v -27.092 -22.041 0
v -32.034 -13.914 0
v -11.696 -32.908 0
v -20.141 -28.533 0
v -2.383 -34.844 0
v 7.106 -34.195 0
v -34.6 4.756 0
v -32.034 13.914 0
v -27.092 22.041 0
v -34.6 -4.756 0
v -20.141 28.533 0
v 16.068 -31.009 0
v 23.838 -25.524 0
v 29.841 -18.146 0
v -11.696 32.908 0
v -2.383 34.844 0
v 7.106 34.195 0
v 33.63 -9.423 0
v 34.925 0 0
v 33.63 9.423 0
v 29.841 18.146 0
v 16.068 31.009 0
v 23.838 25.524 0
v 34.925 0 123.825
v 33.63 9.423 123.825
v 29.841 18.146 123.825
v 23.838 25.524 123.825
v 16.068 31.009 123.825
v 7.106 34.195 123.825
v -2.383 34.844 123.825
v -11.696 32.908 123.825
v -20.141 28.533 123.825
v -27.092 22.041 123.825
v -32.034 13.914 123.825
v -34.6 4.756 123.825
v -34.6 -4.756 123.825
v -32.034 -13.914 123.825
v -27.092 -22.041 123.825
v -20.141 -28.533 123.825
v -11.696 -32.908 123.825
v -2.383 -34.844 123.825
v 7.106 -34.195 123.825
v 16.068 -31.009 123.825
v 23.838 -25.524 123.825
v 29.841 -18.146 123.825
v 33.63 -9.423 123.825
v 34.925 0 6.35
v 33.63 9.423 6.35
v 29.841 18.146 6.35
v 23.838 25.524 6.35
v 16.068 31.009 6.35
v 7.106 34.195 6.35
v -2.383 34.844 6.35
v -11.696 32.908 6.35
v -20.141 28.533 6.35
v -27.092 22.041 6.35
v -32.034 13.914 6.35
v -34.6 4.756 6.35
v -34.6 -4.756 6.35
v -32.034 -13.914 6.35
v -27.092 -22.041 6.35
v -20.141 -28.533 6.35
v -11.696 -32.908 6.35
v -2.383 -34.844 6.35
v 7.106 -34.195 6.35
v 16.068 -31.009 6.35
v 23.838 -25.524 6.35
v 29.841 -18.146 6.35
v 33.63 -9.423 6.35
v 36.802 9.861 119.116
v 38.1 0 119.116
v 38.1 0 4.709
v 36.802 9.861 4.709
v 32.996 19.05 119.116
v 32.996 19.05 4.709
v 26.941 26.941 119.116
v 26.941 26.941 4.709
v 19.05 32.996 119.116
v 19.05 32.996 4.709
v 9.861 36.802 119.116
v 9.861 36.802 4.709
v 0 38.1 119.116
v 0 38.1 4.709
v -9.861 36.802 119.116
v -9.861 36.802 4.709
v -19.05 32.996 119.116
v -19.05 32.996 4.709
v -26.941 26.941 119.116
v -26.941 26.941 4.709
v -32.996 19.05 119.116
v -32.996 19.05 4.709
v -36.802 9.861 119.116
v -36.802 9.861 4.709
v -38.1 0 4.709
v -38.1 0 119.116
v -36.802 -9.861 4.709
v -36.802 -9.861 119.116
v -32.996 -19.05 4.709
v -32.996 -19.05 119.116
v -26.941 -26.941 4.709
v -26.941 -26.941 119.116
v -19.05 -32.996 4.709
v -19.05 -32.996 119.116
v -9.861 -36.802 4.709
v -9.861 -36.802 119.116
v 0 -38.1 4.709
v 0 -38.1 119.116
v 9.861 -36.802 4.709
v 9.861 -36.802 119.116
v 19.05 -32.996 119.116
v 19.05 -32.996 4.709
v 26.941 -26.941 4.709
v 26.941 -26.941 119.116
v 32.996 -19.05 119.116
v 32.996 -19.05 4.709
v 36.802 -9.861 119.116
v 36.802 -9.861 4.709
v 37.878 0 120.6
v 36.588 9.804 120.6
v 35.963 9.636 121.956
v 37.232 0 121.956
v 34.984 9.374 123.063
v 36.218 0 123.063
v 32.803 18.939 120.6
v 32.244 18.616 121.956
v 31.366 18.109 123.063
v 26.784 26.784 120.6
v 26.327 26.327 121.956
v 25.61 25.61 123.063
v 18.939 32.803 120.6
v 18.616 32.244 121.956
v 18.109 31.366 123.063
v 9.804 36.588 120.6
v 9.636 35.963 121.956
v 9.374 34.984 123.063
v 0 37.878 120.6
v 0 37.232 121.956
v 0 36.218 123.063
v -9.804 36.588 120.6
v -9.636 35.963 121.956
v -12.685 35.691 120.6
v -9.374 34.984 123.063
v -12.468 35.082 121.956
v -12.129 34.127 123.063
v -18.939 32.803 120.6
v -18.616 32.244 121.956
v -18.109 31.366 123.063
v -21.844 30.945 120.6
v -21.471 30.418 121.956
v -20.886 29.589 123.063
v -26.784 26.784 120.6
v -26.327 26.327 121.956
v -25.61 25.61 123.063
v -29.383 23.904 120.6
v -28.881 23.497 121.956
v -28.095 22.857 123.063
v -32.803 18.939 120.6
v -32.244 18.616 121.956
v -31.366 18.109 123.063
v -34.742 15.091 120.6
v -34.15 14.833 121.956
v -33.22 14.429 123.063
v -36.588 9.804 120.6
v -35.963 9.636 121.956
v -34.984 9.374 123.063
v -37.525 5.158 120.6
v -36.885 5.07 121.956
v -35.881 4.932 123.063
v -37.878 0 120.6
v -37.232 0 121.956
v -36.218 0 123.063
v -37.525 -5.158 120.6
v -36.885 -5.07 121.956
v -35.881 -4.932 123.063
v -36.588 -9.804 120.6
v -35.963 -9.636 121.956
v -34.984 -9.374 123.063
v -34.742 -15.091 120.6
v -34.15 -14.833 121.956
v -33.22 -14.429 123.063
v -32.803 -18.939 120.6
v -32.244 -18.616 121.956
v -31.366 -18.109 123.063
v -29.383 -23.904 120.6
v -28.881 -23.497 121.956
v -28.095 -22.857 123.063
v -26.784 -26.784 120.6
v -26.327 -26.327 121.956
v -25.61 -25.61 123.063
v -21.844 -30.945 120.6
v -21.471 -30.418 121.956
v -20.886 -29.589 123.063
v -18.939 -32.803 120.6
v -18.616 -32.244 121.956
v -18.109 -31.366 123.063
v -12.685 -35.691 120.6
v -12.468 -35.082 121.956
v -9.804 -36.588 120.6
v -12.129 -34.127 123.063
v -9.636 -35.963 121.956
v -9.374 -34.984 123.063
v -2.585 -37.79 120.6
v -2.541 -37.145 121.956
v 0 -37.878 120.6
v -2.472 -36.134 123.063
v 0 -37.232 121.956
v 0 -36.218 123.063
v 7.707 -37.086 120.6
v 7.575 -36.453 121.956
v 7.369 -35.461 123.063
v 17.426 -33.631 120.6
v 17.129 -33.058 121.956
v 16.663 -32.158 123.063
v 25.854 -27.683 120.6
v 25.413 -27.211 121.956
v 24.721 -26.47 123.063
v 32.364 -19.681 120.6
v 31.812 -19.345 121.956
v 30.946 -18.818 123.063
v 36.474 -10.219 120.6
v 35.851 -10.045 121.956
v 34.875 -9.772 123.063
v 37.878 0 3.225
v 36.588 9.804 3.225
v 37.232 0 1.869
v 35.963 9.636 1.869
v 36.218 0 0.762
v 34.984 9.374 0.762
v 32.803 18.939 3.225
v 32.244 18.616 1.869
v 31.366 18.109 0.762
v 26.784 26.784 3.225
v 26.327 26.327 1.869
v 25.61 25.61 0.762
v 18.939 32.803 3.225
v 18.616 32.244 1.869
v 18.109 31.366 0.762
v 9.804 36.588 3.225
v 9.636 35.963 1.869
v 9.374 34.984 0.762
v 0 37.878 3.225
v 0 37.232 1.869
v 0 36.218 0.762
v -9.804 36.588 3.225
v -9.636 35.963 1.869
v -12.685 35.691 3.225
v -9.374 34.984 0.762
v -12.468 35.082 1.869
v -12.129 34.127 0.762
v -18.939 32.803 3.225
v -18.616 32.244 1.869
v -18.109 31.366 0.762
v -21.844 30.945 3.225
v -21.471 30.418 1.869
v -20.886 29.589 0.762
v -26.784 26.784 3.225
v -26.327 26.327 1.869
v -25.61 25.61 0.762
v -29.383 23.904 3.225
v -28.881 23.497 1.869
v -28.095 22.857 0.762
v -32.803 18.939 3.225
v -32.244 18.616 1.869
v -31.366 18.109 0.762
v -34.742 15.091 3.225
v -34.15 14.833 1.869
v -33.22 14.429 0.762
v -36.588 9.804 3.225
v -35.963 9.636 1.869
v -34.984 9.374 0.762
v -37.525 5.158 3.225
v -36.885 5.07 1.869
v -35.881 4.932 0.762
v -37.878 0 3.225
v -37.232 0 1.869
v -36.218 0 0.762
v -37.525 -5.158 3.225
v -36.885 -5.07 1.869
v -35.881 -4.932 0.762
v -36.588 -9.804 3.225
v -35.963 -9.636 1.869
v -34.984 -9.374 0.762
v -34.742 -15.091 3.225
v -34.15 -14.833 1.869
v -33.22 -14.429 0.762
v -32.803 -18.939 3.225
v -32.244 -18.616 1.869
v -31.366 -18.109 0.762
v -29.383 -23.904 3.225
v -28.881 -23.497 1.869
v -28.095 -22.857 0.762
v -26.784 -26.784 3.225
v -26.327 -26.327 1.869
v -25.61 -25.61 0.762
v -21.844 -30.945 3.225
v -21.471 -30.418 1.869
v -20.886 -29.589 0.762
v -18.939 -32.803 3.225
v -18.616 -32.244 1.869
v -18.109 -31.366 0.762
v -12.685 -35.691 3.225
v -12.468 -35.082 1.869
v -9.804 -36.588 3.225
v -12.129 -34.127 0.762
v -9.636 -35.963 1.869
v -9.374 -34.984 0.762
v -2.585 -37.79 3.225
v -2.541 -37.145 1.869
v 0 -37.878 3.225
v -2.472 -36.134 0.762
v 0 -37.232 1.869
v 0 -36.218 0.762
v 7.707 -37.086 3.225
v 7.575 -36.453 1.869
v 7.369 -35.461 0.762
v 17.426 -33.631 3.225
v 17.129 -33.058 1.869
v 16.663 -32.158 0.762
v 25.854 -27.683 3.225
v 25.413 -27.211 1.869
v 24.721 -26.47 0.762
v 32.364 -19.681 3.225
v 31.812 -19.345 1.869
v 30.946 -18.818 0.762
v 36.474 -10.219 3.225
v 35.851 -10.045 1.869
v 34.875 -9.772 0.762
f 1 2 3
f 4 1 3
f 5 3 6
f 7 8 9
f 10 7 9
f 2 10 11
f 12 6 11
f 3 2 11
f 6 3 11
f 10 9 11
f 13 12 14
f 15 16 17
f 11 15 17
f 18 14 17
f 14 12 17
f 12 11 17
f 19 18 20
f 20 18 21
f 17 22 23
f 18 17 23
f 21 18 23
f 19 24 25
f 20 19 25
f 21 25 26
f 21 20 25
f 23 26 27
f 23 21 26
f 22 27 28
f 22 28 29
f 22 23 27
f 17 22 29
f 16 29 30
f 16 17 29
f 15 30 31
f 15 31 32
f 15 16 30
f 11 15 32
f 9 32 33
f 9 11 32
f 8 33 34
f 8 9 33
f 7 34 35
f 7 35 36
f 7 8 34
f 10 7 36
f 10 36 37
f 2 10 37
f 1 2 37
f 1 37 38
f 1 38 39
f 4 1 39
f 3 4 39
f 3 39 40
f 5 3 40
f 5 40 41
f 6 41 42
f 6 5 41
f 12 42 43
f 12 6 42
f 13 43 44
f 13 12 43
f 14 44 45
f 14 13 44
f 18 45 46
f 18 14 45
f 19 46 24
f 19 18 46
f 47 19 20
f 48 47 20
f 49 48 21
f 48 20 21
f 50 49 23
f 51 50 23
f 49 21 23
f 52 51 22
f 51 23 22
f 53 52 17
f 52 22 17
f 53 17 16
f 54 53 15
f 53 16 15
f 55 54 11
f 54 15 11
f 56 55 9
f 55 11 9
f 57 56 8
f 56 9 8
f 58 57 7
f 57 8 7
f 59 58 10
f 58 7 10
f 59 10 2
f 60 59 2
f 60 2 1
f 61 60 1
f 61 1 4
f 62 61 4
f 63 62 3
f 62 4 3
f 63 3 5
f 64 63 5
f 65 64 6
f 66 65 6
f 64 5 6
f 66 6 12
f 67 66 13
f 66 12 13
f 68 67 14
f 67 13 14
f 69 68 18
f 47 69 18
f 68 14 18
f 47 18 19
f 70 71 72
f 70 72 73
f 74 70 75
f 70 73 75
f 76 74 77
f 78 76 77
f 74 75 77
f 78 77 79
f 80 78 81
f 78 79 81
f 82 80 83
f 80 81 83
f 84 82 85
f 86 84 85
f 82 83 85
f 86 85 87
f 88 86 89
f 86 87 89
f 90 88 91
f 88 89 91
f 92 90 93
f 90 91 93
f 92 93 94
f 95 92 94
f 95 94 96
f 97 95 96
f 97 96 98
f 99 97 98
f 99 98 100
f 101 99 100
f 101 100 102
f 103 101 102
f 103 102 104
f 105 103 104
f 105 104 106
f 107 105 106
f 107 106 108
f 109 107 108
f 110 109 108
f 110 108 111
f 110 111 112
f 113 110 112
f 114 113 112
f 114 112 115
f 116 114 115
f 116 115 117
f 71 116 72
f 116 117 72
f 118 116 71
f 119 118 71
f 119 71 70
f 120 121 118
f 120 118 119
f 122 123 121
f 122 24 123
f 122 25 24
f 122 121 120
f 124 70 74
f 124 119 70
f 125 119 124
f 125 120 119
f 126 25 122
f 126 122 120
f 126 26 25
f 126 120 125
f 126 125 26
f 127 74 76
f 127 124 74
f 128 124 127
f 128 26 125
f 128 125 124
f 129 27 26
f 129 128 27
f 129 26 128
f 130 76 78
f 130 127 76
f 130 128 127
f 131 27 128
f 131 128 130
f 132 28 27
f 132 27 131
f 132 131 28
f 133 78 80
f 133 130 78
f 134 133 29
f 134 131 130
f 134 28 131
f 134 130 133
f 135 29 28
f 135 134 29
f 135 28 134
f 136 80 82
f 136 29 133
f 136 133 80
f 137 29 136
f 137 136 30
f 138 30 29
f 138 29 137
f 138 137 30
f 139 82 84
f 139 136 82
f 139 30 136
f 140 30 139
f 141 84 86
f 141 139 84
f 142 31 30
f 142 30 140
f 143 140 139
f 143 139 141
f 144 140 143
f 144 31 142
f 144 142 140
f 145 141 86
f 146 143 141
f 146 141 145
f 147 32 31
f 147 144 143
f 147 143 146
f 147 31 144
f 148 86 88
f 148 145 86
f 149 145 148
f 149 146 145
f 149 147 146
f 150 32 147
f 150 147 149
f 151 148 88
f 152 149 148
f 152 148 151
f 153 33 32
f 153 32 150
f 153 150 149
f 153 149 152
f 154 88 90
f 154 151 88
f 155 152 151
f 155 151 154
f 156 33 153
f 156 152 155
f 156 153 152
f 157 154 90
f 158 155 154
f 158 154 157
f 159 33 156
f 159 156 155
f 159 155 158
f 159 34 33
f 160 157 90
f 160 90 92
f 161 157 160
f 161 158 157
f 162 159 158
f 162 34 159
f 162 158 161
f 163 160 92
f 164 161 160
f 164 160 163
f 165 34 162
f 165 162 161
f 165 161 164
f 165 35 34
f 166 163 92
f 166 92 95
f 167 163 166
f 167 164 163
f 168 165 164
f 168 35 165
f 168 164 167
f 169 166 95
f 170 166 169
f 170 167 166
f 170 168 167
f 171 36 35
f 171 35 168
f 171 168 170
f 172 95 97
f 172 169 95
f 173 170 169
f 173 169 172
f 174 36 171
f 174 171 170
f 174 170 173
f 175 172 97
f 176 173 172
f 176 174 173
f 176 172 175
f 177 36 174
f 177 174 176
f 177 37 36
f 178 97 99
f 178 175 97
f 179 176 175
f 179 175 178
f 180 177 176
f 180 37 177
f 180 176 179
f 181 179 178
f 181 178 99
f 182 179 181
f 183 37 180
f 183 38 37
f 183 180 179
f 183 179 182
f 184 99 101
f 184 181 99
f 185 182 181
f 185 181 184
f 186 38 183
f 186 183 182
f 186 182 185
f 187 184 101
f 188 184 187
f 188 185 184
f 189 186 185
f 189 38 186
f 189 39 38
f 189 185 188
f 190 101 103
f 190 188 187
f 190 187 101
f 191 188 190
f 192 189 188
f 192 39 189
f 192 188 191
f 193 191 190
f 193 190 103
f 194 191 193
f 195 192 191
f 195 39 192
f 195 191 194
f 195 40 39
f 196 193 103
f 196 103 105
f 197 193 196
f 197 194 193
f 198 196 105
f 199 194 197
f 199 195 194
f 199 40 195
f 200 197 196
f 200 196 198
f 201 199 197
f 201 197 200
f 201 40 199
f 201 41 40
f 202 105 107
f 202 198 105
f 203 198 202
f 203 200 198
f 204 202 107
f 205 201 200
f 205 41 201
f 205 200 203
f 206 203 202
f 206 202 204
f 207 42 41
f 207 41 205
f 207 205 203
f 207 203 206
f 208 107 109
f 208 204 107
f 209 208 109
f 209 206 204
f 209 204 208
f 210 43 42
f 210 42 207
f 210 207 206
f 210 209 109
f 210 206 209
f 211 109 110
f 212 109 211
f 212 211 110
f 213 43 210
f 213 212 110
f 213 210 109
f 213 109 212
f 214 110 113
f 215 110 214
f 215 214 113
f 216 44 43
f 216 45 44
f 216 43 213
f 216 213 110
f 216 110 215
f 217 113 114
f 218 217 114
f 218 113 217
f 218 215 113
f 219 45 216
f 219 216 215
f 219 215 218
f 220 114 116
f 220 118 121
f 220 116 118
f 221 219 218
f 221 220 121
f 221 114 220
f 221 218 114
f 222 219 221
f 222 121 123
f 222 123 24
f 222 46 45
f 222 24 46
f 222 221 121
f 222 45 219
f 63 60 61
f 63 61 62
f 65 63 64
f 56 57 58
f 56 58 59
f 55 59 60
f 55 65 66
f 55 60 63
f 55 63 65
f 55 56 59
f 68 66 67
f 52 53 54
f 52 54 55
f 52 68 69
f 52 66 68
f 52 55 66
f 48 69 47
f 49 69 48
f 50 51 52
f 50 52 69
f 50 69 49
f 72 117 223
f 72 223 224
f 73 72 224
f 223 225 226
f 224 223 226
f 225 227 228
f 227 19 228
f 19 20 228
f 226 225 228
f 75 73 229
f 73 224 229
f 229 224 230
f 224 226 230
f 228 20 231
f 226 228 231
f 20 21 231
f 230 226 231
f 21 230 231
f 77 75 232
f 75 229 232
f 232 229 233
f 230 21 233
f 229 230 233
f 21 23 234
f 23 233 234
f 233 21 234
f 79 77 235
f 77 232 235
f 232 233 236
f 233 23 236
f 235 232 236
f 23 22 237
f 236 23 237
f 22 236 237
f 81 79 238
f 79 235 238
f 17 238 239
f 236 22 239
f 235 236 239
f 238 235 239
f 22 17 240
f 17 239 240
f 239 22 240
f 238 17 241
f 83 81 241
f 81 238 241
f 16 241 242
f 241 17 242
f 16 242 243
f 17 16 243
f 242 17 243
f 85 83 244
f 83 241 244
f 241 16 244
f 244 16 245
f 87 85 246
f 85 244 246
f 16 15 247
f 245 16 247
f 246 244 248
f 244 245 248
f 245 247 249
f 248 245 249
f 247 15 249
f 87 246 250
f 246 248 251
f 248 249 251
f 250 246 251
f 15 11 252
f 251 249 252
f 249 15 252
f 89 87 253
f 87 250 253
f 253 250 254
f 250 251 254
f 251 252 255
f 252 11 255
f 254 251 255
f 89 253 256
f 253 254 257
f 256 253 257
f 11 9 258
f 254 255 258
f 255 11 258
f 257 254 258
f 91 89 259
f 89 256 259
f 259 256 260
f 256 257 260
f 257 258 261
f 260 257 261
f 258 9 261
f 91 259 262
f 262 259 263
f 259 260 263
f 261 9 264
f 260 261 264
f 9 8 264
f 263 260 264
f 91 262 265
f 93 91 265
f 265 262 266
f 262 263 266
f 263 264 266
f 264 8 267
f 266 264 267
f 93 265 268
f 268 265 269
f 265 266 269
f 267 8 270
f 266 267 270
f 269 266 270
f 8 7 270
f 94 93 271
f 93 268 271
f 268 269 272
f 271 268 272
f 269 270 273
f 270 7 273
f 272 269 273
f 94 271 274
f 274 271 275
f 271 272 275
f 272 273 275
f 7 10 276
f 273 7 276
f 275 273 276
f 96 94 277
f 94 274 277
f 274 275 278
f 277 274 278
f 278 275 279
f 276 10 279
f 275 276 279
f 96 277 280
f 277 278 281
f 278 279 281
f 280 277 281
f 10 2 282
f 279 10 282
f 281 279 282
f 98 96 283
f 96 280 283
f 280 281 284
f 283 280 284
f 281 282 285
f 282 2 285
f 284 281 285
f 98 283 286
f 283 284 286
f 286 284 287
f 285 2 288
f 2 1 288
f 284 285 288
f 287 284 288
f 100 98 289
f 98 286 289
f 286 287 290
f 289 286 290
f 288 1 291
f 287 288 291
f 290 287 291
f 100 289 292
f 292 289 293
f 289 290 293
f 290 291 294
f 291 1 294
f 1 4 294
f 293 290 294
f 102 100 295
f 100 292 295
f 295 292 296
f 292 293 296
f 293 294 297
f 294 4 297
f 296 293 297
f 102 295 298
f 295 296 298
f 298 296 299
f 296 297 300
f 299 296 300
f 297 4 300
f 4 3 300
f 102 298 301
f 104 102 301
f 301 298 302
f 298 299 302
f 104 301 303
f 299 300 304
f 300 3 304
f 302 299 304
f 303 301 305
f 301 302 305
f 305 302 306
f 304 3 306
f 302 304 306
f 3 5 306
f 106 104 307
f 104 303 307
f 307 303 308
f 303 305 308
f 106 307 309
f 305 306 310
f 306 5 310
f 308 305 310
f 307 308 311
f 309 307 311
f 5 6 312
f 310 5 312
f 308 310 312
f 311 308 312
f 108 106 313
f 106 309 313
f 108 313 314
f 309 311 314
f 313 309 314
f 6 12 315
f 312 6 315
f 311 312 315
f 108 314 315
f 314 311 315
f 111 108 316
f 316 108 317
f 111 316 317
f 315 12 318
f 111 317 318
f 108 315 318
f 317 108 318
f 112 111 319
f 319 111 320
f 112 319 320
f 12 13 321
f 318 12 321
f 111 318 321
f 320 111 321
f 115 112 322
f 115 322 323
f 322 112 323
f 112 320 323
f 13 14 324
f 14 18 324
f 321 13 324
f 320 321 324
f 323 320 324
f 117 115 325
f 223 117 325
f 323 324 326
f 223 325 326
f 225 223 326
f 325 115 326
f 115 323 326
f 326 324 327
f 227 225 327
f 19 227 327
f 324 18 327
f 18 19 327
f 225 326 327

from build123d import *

# Parameters (mm, degrees)
F0_R     = 38.1
F0_R_2   = 34.925
F1_DEPTH = 123.825
F2_DEPTH = 6.35


# Not quite as in the source:
# - a fillet or chamfer that OpenCascade refuses, or shapes differently, is made with other operations: its cross-section is extruded or revolved along the edge and cut away or added


with BuildPart() as f1:
    # F0 (on Top) → F1 (new body)
    with BuildSketch(Plane.XY):
        Circle(F0_R)
        Circle(F0_R_2, mode=Mode.SUBTRACT)
    extrude(amount=F1_DEPTH)

    # F3: fillet of radius 5.08 on 1 edges, made by hand

    # F3_s1 → F3_t2 (revolve, cut)
    with BuildSketch(Plane.XZ):
        with BuildLine():
            ThreePointArc((38.1, 119.1157139607), (37.2321134838, 121.9555202921), (34.925, 123.825))
            Line((34.925, 123.825), (38.1, 123.825))
            Line((38.1, 123.825), (38.1, 119.1157139607))
        make_face()
    revolve(axis=Axis((0, 0, 123.825), (0, 0, 1)), mode=Mode.SUBTRACT)

    # F4: fillet of radius 5.08 on 1 edges, made by hand

    # F4_s1 → F4_t2 (revolve, cut)
    with BuildSketch(Plane.XZ):
        with BuildLine():
            ThreePointArc((38.1, 4.7092860393), (37.2321134838, 1.8694797079), (34.925, 0))
            Line((34.925, 0), (38.1, 0))
            Line((38.1, 0), (38.1, 4.7092860393))
        make_face()
    revolve(axis=Axis((0, 0, 0), (0, 0, 1)), mode=Mode.SUBTRACT)


with BuildPart() as f2:
    # F0 (on Top) → F2 (new body)
    with BuildSketch(Plane.XY):
        Circle(F0_R_2)
    extrude(amount=F2_DEPTH)


solid = Compound([f1.part, f2.part])
